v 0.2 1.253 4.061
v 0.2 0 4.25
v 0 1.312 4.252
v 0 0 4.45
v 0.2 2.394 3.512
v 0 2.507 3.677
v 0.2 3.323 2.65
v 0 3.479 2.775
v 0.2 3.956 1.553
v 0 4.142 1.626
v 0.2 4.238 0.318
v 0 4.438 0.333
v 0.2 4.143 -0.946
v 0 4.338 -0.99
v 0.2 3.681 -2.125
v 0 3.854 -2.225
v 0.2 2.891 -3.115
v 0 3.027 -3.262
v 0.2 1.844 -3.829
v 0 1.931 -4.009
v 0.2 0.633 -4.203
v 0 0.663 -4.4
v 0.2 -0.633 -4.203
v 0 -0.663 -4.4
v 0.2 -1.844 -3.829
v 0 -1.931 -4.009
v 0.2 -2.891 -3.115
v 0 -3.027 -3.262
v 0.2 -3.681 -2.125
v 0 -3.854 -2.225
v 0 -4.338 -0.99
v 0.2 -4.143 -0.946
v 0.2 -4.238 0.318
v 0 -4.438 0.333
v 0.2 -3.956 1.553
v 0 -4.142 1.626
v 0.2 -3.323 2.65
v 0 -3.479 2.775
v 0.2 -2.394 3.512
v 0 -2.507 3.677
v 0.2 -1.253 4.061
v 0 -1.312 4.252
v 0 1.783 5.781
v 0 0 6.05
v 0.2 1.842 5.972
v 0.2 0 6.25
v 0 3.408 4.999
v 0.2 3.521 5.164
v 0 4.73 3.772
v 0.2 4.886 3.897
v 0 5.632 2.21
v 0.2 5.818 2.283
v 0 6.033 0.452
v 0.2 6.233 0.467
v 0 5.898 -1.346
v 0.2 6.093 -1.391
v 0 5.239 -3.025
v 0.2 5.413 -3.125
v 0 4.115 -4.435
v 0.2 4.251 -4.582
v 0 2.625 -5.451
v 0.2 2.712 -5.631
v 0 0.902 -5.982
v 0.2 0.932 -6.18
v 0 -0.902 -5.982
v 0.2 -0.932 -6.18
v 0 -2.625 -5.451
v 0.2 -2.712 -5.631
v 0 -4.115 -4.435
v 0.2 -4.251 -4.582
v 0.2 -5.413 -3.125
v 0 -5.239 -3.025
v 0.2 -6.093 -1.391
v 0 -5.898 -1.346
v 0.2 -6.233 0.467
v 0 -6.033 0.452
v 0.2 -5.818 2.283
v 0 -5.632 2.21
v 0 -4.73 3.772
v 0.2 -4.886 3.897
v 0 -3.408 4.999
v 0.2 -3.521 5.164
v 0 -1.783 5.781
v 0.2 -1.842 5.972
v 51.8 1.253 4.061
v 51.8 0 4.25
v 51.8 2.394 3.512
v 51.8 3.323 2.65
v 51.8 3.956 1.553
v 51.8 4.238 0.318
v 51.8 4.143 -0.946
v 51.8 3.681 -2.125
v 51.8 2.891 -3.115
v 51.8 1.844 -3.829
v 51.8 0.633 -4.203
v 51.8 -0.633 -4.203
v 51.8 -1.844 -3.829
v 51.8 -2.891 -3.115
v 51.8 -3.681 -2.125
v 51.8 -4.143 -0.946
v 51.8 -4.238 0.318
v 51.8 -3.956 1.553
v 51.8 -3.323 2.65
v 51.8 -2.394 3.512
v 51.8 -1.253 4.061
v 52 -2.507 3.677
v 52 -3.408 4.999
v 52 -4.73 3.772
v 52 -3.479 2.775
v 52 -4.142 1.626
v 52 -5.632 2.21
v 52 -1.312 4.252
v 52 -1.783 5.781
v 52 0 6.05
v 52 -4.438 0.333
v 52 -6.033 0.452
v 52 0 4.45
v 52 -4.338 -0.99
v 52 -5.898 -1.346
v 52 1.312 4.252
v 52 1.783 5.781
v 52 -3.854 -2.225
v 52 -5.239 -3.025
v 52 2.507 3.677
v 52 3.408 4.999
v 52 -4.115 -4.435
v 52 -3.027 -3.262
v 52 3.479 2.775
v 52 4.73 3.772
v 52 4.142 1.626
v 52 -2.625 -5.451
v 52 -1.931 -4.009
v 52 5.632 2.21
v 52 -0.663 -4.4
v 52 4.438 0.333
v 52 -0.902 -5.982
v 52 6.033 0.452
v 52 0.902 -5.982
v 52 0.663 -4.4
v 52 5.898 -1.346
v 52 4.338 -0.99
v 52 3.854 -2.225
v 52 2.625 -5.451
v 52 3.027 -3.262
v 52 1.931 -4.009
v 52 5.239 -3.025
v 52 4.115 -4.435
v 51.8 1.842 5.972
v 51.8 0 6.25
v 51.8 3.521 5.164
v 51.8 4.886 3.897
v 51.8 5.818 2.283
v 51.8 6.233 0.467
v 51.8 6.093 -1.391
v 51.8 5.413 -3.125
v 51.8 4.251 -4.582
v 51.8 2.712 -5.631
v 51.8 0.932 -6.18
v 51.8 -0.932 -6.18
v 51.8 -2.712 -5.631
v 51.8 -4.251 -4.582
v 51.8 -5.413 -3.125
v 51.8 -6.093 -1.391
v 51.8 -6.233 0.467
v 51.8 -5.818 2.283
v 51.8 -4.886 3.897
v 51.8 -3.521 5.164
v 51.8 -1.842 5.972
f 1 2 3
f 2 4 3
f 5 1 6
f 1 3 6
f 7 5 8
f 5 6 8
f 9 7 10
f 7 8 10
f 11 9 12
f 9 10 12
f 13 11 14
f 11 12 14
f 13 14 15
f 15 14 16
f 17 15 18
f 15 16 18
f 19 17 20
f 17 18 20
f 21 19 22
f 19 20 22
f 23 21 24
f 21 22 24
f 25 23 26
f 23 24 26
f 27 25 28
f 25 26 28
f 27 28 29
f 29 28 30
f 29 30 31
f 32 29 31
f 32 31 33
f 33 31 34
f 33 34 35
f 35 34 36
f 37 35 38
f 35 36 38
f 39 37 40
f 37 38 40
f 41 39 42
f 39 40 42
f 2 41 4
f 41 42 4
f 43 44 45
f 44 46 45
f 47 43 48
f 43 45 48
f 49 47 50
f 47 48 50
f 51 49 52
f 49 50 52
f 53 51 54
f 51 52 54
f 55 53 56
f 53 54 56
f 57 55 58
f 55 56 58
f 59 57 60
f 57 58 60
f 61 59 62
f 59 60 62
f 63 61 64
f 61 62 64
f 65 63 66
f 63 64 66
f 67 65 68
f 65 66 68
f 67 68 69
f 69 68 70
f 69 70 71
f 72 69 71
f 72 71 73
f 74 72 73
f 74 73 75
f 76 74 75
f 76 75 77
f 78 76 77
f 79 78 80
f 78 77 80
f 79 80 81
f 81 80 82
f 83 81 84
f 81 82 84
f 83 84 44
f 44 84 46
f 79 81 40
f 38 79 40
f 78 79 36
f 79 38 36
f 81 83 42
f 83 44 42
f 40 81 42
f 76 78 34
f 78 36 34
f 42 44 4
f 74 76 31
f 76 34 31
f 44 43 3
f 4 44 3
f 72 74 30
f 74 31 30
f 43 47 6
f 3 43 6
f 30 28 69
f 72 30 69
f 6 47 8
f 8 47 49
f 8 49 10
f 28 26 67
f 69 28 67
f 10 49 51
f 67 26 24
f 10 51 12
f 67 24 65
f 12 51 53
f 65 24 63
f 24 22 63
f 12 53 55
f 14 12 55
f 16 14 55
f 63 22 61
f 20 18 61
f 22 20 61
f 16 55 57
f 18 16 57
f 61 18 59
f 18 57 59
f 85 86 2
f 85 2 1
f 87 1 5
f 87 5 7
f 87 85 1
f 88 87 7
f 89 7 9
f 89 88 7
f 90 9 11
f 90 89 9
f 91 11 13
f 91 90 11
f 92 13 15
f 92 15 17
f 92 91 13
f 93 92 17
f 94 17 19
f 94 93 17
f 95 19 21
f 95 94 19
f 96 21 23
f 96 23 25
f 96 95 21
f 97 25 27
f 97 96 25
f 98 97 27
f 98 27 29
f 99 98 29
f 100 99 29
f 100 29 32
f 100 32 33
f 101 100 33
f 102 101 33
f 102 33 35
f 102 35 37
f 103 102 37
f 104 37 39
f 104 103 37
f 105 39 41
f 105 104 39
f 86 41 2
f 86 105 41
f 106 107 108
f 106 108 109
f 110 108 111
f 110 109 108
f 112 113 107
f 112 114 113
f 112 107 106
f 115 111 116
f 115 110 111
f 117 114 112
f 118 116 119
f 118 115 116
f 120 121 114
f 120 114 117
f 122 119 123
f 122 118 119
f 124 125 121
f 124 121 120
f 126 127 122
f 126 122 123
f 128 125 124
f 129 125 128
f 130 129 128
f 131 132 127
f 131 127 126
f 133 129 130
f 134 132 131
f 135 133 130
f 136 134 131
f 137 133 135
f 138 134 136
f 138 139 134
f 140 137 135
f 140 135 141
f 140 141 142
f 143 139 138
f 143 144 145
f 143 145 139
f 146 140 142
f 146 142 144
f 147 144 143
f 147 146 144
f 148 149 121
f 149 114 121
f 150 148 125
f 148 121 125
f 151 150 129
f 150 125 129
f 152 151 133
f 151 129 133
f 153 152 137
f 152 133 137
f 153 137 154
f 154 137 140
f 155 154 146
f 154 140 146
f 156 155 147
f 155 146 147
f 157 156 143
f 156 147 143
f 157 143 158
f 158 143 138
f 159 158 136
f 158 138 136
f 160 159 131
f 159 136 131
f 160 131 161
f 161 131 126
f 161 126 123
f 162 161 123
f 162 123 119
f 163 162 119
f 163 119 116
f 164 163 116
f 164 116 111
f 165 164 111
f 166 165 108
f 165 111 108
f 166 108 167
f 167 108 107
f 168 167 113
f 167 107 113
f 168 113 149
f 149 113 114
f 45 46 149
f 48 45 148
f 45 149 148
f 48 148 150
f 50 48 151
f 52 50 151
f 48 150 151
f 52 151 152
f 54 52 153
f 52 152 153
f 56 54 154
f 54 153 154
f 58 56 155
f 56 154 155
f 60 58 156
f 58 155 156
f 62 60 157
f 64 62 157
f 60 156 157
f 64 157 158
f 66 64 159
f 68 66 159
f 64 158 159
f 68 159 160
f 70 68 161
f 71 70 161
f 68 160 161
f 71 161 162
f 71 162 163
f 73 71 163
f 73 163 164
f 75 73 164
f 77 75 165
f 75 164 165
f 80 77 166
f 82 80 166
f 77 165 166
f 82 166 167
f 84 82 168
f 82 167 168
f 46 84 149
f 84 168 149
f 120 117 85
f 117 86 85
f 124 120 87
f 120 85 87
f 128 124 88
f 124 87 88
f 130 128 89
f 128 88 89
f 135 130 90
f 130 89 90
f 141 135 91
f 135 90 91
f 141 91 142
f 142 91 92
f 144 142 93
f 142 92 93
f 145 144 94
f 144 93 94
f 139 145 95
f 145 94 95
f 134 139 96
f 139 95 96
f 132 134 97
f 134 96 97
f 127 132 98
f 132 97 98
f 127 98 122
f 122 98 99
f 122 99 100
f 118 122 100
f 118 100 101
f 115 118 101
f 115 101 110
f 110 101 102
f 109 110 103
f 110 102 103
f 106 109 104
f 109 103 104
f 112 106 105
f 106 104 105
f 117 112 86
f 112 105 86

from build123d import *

# Parameters (mm, degrees)
SKETCH_1_W = 52
SKETCH_1_H = 6.25
SKETCH_4_W = 52
SKETCH_4_H = 4.25


with BuildPart() as part:
    # ｽｹｯﾁ1 → 回転1 (revolve)
    with BuildSketch(Plane.XY, mode=Mode.PRIVATE) as revolve_1_sk:
        with Locations((26, 3.125)):
            Rectangle(SKETCH_1_W, SKETCH_1_H)
    revolve(revolve_1_sk.sketch.rotate(Axis((500, 0, 0), (-1, 0, 0)), 270), axis=Axis((500, 0, 0), (-1, 0, 0)))

    # ｽｹｯﾁ2 → ｶｯﾄ - 回転1 (revolve, cut)
    with BuildSketch(Plane.XY, mode=Mode.PRIVATE) as cut_revolve_1_sk:
        Polygon((51.8, 6.25), (52, 6.05), (52, 6.25), align=None)
    revolve(cut_revolve_1_sk.sketch.rotate(Axis((104, 0, 0), (-1, 0, 0)), 270), axis=Axis((104, 0, 0), (-1, 0, 0)), mode=Mode.SUBTRACT)

    # ｽｹｯﾁ3 → ｶｯﾄ - 回転2 (revolve, cut)
    with BuildSketch(Plane.XY, mode=Mode.PRIVATE) as cut_revolve_2_sk:
        Polygon((0, 6.25), (0, 6.05), (0.2, 6.25), align=None)
    revolve(cut_revolve_2_sk.sketch.rotate(Axis((104, 0, 0), (-1, 0, 0)), 270), axis=Axis((104, 0, 0), (-1, 0, 0)), mode=Mode.SUBTRACT)

    # ｽｹｯﾁ4 → ｶｯﾄ - 回転3 (revolve, cut)
    with BuildSketch(Plane.XY, mode=Mode.PRIVATE) as cut_revolve_3_sk:
        with Locations((26, 2.125)):
            Rectangle(SKETCH_4_W, SKETCH_4_H)
    revolve(cut_revolve_3_sk.sketch.rotate(Axis((25, 0, 0), (-1, 0, 0)), 270), axis=Axis((25, 0, 0), (-1, 0, 0)), mode=Mode.SUBTRACT)

    # ｽｹｯﾁ5 → ｶｯﾄ - 回転4 (revolve, cut)
    with BuildSketch(Plane.XY, mode=Mode.PRIVATE) as cut_revolve_4_sk:
        Polygon((0, 4.45), (0, 4.25), (0.2, 4.25), align=None)
    revolve(cut_revolve_4_sk.sketch.rotate(Axis((25, 0, 0), (-1, 0, 0)), 270), axis=Axis((25, 0, 0), (-1, 0, 0)), mode=Mode.SUBTRACT)

    # ｽｹｯﾁ6 → ｶｯﾄ - 回転5 (revolve, cut)
    with BuildSketch(Plane.XY, mode=Mode.PRIVATE) as cut_revolve_5_sk:
        Polygon((51.8, 4.25), (52, 4.25), (52, 4.45), align=None)
    revolve(cut_revolve_5_sk.sketch.rotate(Axis((25, 0, 0), (-1, 0, 0)), 270), axis=Axis((25, 0, 0), (-1, 0, 0)), mode=Mode.SUBTRACT)


solid = part.part
